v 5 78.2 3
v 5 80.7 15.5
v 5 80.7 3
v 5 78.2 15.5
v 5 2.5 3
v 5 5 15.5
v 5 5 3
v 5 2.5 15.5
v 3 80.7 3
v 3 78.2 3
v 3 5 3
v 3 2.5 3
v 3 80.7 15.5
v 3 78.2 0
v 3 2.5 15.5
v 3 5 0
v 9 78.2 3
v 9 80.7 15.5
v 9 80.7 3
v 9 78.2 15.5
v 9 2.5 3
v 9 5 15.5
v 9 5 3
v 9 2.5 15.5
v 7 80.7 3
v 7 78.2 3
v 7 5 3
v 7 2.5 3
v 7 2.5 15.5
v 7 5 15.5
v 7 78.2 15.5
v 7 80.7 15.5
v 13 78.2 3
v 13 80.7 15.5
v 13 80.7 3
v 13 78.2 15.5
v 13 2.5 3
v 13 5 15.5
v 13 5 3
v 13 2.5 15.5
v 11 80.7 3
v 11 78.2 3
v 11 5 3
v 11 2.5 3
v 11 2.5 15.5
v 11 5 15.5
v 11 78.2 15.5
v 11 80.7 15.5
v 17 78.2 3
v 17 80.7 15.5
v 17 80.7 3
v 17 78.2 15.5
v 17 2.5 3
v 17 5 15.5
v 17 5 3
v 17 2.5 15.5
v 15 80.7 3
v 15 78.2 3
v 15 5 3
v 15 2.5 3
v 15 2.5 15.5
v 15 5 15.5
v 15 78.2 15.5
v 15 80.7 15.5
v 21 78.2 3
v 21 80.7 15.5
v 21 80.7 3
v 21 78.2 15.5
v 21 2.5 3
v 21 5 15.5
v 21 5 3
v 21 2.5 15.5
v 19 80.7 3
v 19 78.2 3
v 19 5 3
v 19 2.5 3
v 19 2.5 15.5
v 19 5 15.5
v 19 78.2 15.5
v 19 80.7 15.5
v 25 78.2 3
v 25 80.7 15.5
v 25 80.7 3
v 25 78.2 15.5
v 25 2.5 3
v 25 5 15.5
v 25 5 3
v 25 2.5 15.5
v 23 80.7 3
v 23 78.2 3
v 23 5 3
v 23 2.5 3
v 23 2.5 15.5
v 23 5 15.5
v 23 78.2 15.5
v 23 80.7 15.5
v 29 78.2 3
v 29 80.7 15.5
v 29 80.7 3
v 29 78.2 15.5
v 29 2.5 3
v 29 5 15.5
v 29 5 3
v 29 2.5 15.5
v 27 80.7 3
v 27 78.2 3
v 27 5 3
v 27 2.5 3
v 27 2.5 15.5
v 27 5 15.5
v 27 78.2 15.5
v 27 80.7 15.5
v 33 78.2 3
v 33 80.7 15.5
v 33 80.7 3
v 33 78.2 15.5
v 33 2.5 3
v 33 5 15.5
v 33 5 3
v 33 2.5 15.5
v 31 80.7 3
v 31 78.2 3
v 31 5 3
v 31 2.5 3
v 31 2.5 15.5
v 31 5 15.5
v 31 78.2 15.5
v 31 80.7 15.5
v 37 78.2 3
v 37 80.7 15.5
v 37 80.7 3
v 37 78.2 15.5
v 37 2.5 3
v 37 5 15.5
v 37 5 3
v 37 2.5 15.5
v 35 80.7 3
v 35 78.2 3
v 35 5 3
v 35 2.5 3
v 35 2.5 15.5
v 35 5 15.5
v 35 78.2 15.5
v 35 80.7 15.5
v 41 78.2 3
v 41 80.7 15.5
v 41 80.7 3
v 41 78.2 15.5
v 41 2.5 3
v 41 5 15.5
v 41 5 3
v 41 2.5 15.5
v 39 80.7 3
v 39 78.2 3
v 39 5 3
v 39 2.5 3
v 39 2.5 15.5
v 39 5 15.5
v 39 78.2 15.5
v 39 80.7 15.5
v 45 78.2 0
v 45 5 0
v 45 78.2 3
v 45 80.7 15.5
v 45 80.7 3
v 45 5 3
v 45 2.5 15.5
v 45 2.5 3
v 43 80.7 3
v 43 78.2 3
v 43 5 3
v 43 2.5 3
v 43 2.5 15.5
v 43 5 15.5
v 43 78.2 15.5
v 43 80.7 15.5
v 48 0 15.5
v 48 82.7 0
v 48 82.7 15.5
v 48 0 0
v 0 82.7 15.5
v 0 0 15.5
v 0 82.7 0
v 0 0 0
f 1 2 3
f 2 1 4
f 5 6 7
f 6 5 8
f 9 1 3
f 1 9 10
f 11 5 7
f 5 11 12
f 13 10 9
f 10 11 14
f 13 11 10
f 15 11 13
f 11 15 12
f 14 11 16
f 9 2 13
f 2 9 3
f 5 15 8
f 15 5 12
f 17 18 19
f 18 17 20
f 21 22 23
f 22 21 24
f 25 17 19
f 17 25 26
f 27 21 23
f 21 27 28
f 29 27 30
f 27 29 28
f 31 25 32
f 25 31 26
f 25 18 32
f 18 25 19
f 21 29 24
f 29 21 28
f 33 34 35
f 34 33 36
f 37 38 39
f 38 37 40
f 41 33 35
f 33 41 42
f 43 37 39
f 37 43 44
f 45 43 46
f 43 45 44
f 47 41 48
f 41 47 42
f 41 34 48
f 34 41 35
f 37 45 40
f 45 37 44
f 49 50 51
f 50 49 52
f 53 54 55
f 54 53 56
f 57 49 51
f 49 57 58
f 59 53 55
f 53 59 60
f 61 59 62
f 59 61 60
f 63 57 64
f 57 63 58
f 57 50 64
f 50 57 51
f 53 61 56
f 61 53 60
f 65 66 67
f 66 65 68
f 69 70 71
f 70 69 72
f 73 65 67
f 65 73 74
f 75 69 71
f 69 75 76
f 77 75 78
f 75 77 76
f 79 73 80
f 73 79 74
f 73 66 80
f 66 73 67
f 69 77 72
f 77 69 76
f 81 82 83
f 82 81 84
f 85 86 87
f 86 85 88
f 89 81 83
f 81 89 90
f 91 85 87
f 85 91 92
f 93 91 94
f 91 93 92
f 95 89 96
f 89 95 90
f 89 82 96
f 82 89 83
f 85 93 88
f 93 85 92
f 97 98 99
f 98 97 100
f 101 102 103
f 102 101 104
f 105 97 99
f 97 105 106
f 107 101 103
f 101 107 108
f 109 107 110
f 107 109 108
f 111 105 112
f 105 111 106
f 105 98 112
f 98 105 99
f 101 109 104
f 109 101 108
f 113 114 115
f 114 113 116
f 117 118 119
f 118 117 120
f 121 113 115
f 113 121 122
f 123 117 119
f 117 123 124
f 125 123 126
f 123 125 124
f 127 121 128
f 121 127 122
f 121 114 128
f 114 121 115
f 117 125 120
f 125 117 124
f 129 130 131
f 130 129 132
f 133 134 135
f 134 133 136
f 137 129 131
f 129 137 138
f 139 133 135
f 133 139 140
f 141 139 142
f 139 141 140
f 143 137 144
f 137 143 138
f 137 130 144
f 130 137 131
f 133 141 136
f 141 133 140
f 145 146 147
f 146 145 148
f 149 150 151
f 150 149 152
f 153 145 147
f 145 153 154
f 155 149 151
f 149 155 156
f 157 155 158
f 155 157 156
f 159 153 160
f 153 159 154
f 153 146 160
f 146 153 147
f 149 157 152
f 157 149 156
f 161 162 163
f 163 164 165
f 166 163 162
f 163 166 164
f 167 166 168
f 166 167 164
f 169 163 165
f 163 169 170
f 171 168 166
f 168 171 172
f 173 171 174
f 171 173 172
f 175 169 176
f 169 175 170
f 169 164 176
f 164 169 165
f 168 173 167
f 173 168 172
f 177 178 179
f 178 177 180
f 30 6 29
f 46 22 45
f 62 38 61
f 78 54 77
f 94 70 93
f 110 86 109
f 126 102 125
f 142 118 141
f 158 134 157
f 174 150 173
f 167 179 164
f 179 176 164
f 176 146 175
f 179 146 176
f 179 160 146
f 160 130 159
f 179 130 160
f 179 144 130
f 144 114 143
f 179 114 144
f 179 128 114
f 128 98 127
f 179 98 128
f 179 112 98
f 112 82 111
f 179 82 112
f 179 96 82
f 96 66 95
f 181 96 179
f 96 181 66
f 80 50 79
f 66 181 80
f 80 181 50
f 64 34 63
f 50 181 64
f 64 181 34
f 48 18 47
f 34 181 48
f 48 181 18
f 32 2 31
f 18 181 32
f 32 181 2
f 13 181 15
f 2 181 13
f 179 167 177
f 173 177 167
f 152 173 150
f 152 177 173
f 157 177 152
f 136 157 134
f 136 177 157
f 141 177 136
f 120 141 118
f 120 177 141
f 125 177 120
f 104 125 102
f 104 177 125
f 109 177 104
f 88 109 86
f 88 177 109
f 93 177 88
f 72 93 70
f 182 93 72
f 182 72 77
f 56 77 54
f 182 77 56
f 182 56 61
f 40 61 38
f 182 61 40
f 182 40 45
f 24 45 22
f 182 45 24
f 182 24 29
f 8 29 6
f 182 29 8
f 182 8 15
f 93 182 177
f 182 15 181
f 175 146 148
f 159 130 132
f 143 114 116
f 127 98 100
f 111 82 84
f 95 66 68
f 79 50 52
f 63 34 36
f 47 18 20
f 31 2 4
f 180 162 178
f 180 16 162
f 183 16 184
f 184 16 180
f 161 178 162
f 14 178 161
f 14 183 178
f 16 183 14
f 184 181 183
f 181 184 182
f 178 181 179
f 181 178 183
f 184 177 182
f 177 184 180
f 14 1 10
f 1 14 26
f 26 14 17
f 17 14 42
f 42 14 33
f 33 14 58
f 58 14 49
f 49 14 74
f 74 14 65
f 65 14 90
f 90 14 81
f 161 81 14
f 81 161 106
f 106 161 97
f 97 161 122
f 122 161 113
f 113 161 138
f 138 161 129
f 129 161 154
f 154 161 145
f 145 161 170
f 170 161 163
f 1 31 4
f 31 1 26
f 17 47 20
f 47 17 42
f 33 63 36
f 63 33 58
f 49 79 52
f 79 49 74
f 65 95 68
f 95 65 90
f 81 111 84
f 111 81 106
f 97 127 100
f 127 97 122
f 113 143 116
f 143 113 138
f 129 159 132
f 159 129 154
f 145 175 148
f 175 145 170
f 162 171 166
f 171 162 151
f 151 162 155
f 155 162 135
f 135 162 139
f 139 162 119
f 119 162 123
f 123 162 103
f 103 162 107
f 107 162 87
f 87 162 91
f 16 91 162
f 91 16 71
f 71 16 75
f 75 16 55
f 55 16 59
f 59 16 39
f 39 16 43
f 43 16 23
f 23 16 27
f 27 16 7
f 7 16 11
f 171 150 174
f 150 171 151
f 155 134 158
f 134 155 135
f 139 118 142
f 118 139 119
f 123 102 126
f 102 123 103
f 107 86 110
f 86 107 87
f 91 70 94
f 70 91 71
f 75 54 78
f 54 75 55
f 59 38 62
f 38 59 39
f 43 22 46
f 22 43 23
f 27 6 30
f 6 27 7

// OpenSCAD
// Lucas Wilder - Michigan Technological University - EE 4777
// Microscope Slide Holder

// Number of slides
slides = 10;

// Slide thickness in mm
thickness = 1;

// Slide length in mm
length = 76.2;

// Slide width in mm
width = 25;

difference()
{
	// Union of main part to handle mounts
	union()
	{
		// Handle mounts
		//translate([(4*slides+8)/2,(length+6.5)/2,(width/2)+6])
		//cube(size = [4*slides+8,10,6],center = true);

		// Main body
		cube(size = [4*slides+8,length+6.5,(width/2)+3], center = false);
		
	}
	
	// Slides with tolerance
	for(i=[0:1:slides])
	{
		translate([3+(4*i),2.5,3]) 
		cube(size = [thickness+1,length+2,width],center = false);
	}
	
	// Center cut
	translate([3,5,-1])
	cube(size = [4*slides+2,length-3,width+4], center = false);
	
	//Handle slots
//	translate([(4*slides+8)/2,(length+6.5)/2,(width/2)+5])
//	cube(size = [4*slides+8,6,4],center = true);

}
